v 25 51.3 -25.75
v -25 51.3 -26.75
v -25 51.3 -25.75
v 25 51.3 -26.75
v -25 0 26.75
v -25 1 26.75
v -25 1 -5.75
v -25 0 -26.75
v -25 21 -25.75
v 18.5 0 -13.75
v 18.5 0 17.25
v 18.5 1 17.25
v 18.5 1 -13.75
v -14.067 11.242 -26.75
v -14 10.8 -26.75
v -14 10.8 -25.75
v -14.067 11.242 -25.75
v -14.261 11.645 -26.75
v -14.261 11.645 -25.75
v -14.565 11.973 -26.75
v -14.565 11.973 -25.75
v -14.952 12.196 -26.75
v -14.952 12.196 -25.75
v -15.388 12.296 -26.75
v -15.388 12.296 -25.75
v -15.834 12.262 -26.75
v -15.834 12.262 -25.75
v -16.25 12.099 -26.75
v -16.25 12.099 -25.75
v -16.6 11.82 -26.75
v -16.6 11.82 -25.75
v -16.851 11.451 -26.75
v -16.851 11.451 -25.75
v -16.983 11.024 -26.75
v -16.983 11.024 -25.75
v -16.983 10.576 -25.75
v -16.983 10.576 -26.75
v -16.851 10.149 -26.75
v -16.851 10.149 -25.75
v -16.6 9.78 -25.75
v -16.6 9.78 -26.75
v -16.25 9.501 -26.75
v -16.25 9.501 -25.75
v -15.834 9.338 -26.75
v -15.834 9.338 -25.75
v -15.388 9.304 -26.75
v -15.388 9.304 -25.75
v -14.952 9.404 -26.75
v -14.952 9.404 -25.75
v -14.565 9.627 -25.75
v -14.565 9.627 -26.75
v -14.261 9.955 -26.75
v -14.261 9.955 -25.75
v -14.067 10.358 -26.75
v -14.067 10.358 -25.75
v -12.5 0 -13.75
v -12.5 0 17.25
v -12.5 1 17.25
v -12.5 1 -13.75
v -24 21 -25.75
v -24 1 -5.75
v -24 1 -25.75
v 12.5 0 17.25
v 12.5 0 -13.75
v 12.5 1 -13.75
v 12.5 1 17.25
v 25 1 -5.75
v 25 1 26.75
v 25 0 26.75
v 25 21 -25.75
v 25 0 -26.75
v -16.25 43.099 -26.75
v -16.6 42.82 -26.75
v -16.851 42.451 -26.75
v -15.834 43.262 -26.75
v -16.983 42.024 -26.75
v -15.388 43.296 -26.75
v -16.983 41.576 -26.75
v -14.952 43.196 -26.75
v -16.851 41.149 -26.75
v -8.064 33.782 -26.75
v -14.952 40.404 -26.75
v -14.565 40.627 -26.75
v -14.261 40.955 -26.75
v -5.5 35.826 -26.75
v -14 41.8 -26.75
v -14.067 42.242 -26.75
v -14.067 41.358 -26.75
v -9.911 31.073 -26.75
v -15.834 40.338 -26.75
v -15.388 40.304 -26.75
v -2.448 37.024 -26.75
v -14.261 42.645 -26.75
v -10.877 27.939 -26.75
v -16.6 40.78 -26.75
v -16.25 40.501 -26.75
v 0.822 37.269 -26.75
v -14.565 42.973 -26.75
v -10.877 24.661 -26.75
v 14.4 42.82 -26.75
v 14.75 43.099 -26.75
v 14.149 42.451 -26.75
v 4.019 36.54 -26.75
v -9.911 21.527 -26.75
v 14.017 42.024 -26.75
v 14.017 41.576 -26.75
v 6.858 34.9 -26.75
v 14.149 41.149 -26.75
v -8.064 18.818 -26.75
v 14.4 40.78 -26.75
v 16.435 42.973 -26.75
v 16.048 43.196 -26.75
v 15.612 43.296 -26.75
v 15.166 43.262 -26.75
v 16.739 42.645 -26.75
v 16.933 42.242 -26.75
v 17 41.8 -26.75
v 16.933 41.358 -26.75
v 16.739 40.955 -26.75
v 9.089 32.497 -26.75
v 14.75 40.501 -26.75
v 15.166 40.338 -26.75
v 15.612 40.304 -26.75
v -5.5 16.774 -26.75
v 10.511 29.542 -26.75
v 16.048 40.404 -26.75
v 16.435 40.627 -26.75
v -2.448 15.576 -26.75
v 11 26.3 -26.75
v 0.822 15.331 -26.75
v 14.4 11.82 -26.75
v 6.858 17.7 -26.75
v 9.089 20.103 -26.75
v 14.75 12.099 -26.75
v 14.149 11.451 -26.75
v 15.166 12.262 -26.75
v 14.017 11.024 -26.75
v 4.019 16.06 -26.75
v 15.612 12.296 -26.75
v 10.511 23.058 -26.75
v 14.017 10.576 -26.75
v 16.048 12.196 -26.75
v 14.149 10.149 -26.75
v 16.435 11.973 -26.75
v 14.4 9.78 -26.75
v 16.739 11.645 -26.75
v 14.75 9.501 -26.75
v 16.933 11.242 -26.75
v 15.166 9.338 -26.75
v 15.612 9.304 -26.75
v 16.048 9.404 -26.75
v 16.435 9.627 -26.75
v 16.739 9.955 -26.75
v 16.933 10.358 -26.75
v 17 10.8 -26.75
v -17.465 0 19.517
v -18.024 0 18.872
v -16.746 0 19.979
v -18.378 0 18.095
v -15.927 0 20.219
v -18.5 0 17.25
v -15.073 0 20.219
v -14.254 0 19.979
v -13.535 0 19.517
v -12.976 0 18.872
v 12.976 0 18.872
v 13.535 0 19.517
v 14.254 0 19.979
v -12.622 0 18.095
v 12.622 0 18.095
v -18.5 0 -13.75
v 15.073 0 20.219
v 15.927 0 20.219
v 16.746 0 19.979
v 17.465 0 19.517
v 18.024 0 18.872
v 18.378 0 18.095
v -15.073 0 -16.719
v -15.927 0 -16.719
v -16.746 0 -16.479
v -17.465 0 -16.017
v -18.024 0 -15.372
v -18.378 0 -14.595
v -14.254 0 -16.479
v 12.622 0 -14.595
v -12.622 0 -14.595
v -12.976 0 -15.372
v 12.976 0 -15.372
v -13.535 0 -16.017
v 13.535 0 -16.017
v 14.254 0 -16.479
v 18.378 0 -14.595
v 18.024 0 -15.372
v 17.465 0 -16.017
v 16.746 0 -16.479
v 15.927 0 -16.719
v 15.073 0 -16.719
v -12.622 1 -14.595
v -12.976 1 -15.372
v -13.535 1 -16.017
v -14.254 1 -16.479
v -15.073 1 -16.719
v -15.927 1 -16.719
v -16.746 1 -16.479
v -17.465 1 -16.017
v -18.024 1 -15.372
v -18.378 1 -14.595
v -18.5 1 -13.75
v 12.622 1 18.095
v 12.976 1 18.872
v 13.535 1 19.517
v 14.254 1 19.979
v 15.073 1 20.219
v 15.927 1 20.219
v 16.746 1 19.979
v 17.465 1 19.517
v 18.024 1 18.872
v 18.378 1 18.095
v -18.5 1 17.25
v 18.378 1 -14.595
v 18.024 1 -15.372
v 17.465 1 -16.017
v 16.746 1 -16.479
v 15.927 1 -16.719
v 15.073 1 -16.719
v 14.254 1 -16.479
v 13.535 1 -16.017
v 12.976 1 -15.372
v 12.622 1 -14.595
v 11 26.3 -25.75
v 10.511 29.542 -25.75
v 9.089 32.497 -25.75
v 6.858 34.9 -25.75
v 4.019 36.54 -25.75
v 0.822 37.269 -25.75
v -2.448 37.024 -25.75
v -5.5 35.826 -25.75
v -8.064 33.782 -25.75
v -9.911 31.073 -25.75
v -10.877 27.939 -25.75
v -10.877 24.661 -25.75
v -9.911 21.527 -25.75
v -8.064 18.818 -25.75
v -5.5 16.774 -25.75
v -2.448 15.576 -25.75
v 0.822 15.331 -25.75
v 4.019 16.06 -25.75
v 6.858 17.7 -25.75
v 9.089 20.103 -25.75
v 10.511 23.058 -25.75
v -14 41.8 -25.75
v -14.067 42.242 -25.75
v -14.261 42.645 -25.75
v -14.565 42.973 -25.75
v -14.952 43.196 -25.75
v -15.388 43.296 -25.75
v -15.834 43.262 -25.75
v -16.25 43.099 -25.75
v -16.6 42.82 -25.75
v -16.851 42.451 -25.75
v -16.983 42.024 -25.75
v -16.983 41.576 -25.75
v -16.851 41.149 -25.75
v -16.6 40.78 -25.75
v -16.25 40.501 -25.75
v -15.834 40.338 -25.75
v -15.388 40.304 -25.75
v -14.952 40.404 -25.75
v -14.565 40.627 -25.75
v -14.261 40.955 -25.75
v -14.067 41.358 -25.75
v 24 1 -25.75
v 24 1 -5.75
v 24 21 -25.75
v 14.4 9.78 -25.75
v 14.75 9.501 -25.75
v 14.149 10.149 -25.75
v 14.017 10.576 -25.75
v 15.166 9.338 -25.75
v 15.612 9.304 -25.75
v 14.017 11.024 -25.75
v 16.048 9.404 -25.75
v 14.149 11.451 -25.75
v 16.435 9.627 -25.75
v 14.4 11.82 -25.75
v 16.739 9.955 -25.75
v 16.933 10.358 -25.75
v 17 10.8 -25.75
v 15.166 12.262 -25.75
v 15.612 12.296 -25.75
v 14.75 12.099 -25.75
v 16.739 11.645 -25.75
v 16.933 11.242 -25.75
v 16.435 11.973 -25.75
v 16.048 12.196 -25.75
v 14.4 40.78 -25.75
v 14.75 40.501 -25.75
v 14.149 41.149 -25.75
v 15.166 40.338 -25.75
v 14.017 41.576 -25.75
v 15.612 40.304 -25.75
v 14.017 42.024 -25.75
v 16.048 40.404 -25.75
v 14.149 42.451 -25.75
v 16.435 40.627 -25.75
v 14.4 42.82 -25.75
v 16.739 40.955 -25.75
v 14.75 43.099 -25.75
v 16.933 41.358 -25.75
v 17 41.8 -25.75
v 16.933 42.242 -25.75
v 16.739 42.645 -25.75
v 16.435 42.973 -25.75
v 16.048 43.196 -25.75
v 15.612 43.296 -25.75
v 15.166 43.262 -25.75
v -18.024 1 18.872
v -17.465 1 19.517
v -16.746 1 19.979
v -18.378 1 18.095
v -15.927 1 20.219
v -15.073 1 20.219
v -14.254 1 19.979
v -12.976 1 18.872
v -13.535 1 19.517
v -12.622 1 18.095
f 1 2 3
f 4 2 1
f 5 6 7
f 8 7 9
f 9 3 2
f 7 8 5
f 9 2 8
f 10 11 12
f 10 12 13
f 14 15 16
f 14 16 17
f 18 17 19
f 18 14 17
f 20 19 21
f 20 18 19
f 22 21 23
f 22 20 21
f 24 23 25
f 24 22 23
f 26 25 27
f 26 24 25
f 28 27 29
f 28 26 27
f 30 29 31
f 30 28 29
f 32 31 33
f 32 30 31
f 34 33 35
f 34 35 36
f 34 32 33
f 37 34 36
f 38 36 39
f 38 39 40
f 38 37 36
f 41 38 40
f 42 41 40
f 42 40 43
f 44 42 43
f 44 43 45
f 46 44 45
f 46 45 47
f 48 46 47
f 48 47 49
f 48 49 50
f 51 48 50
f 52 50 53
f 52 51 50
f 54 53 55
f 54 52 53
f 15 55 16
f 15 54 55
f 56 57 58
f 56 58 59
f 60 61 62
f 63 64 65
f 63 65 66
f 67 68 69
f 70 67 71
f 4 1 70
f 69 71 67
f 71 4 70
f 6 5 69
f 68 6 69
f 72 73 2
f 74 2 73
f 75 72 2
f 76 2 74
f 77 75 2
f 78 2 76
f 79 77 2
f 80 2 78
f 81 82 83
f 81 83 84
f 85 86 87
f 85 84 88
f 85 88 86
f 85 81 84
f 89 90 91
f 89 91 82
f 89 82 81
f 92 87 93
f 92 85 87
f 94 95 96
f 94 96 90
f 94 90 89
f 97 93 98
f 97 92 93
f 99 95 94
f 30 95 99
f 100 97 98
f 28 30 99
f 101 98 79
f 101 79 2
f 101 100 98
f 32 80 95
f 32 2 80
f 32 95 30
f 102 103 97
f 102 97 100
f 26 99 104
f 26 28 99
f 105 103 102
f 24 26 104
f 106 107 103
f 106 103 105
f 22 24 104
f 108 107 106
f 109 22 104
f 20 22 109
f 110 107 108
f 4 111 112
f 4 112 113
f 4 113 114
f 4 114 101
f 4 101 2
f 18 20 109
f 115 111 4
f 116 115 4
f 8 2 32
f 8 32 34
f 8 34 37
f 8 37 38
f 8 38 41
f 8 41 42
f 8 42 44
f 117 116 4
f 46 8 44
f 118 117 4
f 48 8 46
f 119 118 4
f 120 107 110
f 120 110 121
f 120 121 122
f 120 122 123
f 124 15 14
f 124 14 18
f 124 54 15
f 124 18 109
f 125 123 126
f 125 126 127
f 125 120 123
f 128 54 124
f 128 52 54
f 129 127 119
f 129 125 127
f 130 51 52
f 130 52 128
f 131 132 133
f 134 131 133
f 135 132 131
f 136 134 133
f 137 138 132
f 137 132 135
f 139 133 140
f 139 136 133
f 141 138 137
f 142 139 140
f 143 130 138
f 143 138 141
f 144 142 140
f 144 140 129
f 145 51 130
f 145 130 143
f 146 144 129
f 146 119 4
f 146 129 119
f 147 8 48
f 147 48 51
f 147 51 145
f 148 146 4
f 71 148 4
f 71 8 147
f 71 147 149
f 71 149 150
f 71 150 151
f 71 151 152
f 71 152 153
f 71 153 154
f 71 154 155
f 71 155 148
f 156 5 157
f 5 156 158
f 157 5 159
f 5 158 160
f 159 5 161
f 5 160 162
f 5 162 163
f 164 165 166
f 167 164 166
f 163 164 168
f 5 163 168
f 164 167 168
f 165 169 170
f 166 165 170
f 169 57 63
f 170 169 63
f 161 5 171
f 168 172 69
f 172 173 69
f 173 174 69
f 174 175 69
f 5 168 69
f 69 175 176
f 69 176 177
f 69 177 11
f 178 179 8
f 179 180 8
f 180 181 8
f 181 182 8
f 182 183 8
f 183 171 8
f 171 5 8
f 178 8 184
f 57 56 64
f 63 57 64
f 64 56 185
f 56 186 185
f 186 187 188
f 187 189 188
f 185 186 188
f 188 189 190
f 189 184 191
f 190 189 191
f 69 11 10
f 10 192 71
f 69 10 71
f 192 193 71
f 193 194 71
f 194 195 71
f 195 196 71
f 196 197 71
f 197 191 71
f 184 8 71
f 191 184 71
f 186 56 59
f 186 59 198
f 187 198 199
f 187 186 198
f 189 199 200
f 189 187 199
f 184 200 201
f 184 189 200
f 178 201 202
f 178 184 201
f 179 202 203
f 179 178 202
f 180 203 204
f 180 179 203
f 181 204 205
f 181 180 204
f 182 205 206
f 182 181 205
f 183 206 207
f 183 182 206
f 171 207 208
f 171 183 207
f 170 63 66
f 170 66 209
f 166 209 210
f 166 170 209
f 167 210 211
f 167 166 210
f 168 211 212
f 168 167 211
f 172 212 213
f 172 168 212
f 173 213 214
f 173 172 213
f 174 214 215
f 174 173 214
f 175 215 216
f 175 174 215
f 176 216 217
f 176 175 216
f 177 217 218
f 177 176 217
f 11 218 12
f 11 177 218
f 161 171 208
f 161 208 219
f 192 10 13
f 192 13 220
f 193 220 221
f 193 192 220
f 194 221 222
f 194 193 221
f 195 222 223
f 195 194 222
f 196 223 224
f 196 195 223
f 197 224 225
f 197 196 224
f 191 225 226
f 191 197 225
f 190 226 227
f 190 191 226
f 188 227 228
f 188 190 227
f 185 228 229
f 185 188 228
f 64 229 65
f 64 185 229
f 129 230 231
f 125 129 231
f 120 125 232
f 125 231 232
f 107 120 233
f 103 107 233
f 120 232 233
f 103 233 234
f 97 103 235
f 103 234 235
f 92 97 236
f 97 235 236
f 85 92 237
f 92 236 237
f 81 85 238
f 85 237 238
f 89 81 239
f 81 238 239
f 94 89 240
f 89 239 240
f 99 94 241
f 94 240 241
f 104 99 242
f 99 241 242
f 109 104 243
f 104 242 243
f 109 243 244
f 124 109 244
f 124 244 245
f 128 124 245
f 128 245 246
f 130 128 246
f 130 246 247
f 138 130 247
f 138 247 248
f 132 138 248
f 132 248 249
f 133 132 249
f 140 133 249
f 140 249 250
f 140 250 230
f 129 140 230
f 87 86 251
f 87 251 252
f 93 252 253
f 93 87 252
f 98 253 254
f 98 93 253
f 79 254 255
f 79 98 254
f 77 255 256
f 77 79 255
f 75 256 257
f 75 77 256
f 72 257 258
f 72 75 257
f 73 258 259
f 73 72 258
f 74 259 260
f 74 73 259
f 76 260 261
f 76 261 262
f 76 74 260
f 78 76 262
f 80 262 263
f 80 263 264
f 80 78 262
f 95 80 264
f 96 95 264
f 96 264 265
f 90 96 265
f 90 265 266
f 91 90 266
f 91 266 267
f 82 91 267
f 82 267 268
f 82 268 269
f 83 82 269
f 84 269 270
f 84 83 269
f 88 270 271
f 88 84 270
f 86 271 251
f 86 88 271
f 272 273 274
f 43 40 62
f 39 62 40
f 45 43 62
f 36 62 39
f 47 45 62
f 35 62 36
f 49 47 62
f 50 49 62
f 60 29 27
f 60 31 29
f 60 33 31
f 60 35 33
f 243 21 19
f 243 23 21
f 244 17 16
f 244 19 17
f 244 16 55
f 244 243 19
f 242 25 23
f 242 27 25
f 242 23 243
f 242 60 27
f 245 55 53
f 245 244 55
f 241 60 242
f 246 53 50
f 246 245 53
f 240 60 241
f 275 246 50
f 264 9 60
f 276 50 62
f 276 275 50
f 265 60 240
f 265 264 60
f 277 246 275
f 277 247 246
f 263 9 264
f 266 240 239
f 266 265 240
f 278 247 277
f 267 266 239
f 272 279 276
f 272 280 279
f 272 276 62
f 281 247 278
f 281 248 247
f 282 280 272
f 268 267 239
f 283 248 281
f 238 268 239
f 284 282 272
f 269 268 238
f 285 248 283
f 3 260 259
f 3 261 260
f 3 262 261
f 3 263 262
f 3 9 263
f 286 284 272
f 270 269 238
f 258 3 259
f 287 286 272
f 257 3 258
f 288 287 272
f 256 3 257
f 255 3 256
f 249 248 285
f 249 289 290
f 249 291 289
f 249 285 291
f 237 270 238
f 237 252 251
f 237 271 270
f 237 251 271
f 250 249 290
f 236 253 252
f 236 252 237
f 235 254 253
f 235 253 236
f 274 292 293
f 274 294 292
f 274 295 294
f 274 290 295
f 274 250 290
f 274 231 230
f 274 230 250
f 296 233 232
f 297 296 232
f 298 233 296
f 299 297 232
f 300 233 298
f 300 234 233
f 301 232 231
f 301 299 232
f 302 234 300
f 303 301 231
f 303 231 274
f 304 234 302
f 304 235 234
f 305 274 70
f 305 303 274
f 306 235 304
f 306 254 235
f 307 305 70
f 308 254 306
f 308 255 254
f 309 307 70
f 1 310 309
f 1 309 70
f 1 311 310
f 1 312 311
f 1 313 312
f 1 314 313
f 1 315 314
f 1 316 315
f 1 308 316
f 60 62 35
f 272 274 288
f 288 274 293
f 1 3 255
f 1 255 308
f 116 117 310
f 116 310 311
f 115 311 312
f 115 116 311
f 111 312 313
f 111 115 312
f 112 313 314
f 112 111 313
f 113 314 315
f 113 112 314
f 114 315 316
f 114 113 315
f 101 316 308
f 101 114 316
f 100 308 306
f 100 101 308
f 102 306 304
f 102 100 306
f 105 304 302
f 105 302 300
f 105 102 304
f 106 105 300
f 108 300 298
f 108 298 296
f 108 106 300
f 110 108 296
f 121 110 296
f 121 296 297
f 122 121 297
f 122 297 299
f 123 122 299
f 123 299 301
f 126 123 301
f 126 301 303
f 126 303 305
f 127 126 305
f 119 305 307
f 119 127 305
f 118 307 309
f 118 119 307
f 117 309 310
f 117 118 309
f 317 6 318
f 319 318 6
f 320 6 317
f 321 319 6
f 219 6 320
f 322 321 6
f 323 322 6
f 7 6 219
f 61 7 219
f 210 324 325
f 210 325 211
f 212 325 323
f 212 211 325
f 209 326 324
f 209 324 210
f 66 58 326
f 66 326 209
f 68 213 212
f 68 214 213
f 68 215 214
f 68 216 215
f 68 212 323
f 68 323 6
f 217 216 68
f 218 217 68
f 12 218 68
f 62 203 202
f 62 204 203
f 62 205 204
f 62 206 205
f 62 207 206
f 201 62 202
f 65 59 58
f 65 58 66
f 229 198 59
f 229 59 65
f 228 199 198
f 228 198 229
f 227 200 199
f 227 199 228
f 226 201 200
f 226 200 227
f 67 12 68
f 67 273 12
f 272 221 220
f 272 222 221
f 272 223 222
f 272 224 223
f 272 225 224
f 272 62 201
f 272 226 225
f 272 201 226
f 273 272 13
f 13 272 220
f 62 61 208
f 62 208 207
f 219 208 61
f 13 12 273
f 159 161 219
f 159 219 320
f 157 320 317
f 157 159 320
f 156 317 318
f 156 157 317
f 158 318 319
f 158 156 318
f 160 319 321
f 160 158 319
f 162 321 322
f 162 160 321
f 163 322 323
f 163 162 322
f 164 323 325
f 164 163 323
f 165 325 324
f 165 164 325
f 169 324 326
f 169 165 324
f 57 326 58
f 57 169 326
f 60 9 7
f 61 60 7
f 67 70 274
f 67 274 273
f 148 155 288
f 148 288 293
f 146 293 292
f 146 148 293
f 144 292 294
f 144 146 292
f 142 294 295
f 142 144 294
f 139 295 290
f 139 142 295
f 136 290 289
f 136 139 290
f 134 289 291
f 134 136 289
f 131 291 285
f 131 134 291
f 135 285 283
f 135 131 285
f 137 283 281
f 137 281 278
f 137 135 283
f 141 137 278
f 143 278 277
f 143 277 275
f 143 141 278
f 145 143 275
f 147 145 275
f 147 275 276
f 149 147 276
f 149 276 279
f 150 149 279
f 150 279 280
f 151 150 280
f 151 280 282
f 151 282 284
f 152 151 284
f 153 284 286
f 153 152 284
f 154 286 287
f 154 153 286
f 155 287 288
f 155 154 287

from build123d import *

# Parameters (mm, degrees)
SKETCH_1_W          = 50
SKETCH_1_H          = 53.5
EXTRUDE_1_DEPTH     = 1
SKETCH_2_W          = 50
SKETCH_2_H          = 51.3
SKETCH_2_R          = 1.5
EXTRUDE_2_DEPTH     = 1
EXTRUDE_3_DEPTH     = 1
EXTRUDE_4_DEPTH     = 1
SKETCH_7_R          = 11
CUT_EXTRUDE_1_DEPTH = 78.543149278


with BuildPart() as part:
    # 草图1 → 凸台-拉伸1 (new body)
    with BuildSketch(Plane(origin=(0, 0, 0), x_dir=(1, 0, 0), z_dir=(0, 1, 0))):
        Rectangle(SKETCH_1_W, SKETCH_1_H)
        with BuildLine():
            Line((-18.5, 13.75), (-18.5, -17.25))
            ThreePointArc((-18.5, -17.25), (-15.5, -20.25), (-12.5, -17.25))
            Line((-12.5, -17.25), (-12.5, 13.75))
            ThreePointArc((-12.5, 13.75), (-15.5, 16.75), (-18.5, 13.75))
        make_face(mode=Mode.SUBTRACT)
        with BuildLine():
            Line((12.5, 13.75), (12.5, -17.25))
            ThreePointArc((12.5, -17.25), (15.5, -20.25), (18.5, -17.25))
            Line((18.5, -17.25), (18.5, 13.75))
            ThreePointArc((18.5, 13.75), (15.5, 16.75), (12.5, 13.75))
        make_face(mode=Mode.SUBTRACT)
    extrude(amount=EXTRUDE_1_DEPTH)

    # 草图2 → 凸台-拉伸2 (add)
    with BuildSketch(Plane.XY.offset(-26.75)):
        with Locations((0, 25.65)):
            Rectangle(SKETCH_2_W, SKETCH_2_H)
        with Locations((-15.5, 41.8)):
            Circle(SKETCH_2_R, mode=Mode.SUBTRACT)
        with Locations((15.5, 41.8)):
            Circle(SKETCH_2_R, mode=Mode.SUBTRACT)
        with Locations((-15.5, 10.8)):
            Circle(SKETCH_2_R, mode=Mode.SUBTRACT)
        with Locations((15.5, 10.8)):
            Circle(SKETCH_2_R, mode=Mode.SUBTRACT)
    extrude(amount=EXTRUDE_2_DEPTH)

    # 草图4 → 凸台-拉伸3 (add)
    with BuildSketch(Plane(origin=(-25, 0, 0), x_dir=(0, 0, -1), z_dir=(1, 0, 0))):
        Polygon((25.75, 21), (5.75, 1), (25.75, 1), align=None)
    extrude(amount=EXTRUDE_3_DEPTH)

    # 草图6 → 凸台-拉伸4 (add)
    with BuildSketch(Plane.ZY.offset(-25)):
        Polygon((-25.75, 21), (-5.75, 1), (-25.75, 1), align=None)
    extrude(amount=EXTRUDE_4_DEPTH)

    # 草图7 → 切除-拉伸1 (cut, through all)
    with BuildSketch(Plane.XY.offset(-25.75)):
        with Locations((0, 26.3)):
            Circle(SKETCH_7_R)
    extrude(amount=-CUT_EXTRUDE_1_DEPTH, mode=Mode.SUBTRACT)


solid = part.part
